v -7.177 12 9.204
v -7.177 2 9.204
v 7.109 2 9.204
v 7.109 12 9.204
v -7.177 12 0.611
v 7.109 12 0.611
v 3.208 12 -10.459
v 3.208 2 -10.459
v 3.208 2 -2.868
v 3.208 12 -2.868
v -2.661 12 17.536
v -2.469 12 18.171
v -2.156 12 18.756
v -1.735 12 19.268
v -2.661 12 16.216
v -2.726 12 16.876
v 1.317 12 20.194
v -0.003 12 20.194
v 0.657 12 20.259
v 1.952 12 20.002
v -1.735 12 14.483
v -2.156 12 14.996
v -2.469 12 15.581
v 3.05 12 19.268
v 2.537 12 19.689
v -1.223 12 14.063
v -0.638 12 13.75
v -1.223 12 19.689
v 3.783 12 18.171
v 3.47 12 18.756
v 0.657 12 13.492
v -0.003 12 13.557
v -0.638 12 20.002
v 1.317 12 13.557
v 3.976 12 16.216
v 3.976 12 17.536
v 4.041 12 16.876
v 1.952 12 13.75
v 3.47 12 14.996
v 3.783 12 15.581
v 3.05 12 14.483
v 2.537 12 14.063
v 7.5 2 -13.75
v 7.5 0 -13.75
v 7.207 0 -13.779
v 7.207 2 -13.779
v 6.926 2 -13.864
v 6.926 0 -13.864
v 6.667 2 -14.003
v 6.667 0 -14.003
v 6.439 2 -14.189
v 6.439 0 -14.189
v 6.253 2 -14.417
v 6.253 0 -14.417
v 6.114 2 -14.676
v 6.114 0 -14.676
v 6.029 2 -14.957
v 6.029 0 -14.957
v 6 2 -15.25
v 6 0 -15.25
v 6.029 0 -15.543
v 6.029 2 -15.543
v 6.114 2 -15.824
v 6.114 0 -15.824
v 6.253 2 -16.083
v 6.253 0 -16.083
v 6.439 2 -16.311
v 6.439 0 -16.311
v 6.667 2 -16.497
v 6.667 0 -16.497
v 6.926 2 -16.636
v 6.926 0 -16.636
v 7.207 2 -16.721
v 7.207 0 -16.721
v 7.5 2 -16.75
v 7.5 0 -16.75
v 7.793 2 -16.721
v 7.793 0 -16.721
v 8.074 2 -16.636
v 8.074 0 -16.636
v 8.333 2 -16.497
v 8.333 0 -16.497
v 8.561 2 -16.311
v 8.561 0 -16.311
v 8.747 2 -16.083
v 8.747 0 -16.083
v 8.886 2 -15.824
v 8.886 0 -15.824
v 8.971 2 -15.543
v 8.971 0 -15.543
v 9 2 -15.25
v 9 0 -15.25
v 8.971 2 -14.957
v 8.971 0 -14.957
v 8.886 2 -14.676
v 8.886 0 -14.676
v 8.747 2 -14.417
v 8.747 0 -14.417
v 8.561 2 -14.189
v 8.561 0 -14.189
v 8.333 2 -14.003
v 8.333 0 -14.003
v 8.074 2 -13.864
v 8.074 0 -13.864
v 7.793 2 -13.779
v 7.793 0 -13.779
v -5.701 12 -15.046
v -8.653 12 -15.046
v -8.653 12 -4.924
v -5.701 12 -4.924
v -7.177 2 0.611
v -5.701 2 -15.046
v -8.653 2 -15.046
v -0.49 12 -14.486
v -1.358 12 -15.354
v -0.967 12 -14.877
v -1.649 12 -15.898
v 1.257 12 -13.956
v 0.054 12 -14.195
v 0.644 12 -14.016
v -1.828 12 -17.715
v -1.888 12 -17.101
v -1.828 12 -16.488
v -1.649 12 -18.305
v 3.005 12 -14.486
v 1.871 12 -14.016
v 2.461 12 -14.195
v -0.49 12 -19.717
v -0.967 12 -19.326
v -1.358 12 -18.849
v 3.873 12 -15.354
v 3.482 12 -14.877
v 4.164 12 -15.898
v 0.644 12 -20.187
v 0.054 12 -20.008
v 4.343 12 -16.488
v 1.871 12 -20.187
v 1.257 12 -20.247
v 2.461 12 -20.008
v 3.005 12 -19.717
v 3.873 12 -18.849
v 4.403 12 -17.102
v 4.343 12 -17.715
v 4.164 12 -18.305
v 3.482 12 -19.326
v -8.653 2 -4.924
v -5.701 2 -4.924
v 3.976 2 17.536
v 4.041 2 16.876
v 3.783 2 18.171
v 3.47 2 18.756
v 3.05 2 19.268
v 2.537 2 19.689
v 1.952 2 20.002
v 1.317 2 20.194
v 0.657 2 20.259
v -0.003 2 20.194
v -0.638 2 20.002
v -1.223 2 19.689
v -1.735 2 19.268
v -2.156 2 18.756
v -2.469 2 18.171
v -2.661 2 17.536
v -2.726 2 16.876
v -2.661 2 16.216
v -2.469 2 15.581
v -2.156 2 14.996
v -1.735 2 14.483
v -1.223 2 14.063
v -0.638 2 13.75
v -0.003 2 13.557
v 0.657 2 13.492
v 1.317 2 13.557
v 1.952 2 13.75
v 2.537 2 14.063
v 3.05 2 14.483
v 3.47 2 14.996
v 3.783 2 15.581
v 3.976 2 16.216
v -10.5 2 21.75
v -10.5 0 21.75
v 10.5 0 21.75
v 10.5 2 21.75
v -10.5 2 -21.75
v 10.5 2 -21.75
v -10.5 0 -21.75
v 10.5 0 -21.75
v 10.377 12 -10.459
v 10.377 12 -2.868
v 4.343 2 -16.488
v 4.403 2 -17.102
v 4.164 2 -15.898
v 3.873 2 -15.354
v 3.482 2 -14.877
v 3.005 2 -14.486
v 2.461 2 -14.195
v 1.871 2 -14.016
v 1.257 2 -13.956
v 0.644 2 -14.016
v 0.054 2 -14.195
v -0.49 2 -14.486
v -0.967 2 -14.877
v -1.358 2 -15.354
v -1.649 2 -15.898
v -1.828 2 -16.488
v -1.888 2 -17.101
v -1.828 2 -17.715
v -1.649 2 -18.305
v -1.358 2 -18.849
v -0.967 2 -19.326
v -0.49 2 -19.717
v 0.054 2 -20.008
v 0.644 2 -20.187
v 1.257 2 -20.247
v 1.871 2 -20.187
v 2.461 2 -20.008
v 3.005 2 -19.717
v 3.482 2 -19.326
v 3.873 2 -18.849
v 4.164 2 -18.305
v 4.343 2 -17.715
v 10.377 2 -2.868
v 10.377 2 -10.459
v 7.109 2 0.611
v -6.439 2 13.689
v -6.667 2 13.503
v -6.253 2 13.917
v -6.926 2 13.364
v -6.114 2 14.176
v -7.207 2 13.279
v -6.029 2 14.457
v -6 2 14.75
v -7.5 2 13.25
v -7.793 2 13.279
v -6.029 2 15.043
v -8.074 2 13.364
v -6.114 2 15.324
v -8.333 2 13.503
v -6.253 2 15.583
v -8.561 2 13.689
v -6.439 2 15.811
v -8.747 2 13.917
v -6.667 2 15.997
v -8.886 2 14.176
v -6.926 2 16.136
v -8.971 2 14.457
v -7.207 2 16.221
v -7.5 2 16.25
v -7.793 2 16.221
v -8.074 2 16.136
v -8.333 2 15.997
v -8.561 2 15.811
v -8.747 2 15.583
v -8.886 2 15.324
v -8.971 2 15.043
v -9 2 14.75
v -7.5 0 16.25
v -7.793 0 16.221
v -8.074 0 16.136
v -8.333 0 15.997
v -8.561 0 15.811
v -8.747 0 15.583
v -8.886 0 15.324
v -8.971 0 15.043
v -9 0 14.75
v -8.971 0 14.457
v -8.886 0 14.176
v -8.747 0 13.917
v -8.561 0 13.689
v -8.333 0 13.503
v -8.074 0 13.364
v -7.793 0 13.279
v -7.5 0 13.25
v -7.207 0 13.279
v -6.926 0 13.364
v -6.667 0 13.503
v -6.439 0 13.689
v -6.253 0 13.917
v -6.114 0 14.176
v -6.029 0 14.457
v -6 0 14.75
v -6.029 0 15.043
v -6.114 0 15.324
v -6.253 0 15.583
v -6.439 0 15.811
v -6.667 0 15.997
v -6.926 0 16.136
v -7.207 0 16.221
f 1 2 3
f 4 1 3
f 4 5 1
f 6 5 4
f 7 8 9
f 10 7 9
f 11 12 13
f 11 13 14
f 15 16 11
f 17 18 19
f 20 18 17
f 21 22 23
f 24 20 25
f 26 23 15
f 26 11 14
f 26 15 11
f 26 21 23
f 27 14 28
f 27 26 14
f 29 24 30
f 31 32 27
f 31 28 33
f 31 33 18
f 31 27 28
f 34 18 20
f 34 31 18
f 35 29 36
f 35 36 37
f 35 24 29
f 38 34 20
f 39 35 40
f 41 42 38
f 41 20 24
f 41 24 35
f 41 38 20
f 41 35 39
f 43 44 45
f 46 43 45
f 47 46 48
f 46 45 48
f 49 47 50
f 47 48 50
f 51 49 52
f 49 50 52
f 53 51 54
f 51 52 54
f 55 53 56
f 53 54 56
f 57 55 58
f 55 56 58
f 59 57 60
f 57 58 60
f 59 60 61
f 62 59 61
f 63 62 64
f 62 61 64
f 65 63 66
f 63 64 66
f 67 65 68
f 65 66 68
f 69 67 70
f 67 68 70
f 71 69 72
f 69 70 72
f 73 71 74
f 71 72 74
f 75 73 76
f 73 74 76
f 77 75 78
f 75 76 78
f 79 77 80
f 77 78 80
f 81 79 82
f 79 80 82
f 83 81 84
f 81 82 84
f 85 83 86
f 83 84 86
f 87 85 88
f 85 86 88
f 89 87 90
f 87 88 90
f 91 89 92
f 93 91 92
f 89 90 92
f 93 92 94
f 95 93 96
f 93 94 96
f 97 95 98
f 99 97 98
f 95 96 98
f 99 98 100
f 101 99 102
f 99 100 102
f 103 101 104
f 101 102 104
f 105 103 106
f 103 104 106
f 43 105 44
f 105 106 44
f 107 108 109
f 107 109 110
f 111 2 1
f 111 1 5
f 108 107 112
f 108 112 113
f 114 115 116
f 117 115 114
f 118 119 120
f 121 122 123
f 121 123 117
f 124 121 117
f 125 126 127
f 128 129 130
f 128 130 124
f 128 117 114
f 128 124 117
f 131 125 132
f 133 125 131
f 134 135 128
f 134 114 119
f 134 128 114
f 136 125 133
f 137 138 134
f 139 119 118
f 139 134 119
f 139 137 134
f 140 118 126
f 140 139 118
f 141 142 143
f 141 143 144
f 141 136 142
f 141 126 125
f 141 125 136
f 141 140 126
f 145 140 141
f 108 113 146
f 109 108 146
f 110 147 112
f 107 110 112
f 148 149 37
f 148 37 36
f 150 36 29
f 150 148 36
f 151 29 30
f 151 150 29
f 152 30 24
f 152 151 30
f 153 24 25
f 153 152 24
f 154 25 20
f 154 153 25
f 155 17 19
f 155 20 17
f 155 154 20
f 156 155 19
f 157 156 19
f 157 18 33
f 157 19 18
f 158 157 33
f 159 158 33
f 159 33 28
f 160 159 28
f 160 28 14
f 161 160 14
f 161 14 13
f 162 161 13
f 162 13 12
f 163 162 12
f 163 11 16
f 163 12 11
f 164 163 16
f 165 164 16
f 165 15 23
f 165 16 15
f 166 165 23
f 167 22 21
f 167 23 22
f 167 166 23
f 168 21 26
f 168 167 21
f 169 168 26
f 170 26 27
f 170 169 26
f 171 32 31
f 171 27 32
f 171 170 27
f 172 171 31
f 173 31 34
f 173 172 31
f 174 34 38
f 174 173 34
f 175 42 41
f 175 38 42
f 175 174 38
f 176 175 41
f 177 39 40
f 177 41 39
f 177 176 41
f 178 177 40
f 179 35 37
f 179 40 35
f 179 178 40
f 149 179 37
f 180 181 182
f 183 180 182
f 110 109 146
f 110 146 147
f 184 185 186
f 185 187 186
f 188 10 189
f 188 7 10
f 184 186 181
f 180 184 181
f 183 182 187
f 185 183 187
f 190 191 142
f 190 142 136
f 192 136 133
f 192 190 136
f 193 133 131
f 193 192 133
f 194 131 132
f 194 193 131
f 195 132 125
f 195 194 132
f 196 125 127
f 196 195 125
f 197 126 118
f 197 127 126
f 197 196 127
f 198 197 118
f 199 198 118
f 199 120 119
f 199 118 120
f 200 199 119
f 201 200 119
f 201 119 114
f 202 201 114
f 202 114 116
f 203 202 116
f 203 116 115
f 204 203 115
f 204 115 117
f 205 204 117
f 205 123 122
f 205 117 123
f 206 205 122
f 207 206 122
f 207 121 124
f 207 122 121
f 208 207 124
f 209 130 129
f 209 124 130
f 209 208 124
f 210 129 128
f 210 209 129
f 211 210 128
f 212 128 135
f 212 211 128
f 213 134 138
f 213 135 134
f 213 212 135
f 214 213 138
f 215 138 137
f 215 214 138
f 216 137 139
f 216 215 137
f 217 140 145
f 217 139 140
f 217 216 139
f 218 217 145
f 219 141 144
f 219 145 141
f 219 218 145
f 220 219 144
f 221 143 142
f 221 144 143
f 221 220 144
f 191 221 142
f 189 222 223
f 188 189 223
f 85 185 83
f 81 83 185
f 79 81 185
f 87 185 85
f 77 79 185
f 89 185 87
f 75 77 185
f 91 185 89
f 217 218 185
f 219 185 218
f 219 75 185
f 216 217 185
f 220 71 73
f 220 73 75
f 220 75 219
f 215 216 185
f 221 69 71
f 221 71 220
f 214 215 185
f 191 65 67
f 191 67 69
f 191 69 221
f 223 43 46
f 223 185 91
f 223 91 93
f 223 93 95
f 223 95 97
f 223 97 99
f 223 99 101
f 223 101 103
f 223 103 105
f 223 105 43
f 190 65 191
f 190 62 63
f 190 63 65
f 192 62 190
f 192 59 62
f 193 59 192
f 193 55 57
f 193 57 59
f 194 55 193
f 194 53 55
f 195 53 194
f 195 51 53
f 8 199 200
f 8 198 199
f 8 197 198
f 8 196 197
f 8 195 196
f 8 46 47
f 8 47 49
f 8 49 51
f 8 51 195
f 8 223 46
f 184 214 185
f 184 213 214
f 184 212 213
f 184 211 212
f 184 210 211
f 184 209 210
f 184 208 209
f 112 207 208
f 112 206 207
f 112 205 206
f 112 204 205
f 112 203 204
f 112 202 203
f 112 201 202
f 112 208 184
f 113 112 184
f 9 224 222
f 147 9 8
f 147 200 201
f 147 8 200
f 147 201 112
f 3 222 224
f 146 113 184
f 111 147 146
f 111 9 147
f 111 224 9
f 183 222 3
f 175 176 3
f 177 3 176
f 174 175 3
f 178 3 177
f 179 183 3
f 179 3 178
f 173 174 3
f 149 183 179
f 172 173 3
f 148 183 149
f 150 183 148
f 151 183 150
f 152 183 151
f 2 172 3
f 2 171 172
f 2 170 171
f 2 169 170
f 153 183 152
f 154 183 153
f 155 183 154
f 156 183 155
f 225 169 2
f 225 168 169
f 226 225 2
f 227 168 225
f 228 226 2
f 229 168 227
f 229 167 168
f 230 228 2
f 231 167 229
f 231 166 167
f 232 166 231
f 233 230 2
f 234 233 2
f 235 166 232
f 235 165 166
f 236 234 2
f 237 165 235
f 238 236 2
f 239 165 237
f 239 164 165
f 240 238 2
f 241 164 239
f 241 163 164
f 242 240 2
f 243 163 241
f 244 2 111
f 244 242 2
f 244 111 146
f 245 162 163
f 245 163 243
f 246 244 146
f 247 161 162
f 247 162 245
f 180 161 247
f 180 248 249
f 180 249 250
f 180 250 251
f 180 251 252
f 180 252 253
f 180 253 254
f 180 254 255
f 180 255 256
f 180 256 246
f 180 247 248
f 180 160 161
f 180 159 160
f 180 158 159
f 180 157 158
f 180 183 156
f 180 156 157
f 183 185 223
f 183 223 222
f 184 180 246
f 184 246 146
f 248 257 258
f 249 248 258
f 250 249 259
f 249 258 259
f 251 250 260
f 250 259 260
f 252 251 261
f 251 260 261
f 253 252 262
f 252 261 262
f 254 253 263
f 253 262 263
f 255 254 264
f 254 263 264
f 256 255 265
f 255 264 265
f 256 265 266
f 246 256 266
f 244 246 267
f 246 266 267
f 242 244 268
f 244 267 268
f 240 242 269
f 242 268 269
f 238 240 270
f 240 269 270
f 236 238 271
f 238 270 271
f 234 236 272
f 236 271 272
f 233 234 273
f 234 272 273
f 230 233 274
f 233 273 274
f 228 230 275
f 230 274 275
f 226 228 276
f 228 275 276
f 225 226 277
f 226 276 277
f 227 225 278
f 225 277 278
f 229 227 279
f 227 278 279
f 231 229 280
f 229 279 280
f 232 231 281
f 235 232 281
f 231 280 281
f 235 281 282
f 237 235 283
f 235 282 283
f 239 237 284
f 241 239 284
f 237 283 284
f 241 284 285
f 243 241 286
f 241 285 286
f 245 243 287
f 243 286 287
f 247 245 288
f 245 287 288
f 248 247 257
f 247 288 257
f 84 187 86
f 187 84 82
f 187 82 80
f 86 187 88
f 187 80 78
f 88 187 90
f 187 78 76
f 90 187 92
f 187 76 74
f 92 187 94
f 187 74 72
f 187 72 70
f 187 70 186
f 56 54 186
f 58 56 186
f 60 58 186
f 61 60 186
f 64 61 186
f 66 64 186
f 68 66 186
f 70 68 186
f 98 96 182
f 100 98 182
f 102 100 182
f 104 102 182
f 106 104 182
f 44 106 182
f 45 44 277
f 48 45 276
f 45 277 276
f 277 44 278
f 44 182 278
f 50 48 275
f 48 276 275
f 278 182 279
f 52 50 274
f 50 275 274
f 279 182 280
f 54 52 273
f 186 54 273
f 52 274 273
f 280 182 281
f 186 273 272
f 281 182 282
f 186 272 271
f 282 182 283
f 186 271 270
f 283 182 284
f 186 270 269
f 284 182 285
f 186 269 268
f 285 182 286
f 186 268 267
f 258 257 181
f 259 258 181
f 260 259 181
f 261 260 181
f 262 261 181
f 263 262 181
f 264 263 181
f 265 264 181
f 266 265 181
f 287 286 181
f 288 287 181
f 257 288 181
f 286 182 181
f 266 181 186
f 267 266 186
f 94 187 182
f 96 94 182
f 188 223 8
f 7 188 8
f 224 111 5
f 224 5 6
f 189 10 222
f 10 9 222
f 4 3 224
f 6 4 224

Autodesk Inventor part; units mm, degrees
ref_plane "YZ Plane" through (0, 0, 0) normal (1, 0, 0) x (0, 1, 0)
ref_plane "XZ Plane" through (0, 0, 0) normal (0, 1, 0) x (-1, 0, 0)
ref_plane "XY Plane" through (0, 0, 0) normal (0, 0, 1) x (1, 0, 0)
sketch "Szkic1" plane through (0, 0, 0) normal (0, 1, 0) x (-1, 0, 0)
  line L0 (-10.5, -21.75) -> (10.5, -21.75)
  line L1 (10.5, -21.75) -> (10.5, 21.75)
  line L2 (10.5, 21.75) -> (-10.5, 21.75)
  line L3 (-10.5, 21.75) -> (-10.5, -21.75)
  line L4 (-10.5, -21.75) -> (10.5, 21.75) construction
  line L5 (10.5, -21.75) -> (-10.5, 21.75) construction
  point P0 (0, 0)
  dimension "d0" = 21
  dimension "d1" = 43.5
extrude "Wyciągnięcie proste1" add sketch "Szkic1" along normal blind 2
sketch "Szkic2" plane through (0, 2, 0) normal (0, 1, 0) x (1, 0, 0)
  line L0 (10.5, 21.75) -> (-10.5, 21.75) projected
  line L1 (-10.5, 21.75) -> (-10.5, -21.75) projected
  line L2 (-10.5, -21.75) -> (10.5, -21.75) projected
  line L3 (10.5, -21.75) -> (10.5, 21.75) projected
  point P0 (0, 0)
  point P1 (-7.5, -14.75)
  point P2 (7.5, 15.25)
  dimension "d4" = 3
  dimension "d5" = 7
  dimension "d6" = 6.5
  dimension "d7" = 3
hole "Otwór1" at (-7.5, 2, 14.75) at (7.5, 2, -15.25) direction (0, -1, 0) diameter 3 end through all
sketch "Szkic3" plane through (0, 2, 0) normal (0, 1, 0) x (1, 0, 0)
  line L0 (-7.1772, -9.2041) -> (7.109, -9.2041)
  line L1 (7.109, -9.2041) -> (7.109, -0.6113)
  line L2 (-7.1772, -9.2041) -> (-7.1772, -0.6113)
  line L3 (-7.1772, -0.6113) -> (7.109, -0.6113)
  line L4 (10.3774, 10.4592) -> (3.208, 10.4592)
  line L5 (3.208, 10.4592) -> (3.208, 2.868)
  line L6 (3.208, 2.868) -> (10.3774, 2.868)
  line L7 (10.3774, 2.868) -> (10.3774, 10.4592)
  line L8 (10.3774, 10.4592) -> (3.208, 2.868) construction
  line L9 (3.208, 10.4592) -> (10.3774, 2.868) construction
  line L10 (-5.7011, 15.0455) -> (-8.6533, 15.0455)
  line L11 (-8.6533, 15.0455) -> (-8.6533, 4.924)
  line L12 (-8.6533, 4.924) -> (-5.7011, 4.924)
  line L13 (-5.7011, 4.924) -> (-5.7011, 15.0455)
  line L14 (-5.7011, 15.0455) -> (-8.6533, 4.924) construction
  line L15 (-8.6533, 15.0455) -> (-5.7011, 4.924) construction
  circle A0 centre (0.6572, -16.8759) radius 3.3835
  circle A1 centre (1.2574, 17.1015) radius 3.1458
  point P0 (0, 0)
  point P1 (6.7927, 6.6636)
  point P2 (-7.1772, 9.9848)
extrude "Wyciągnięcie proste2" add sketch "Szkic3" along normal blind 10
properties part number "step up"
